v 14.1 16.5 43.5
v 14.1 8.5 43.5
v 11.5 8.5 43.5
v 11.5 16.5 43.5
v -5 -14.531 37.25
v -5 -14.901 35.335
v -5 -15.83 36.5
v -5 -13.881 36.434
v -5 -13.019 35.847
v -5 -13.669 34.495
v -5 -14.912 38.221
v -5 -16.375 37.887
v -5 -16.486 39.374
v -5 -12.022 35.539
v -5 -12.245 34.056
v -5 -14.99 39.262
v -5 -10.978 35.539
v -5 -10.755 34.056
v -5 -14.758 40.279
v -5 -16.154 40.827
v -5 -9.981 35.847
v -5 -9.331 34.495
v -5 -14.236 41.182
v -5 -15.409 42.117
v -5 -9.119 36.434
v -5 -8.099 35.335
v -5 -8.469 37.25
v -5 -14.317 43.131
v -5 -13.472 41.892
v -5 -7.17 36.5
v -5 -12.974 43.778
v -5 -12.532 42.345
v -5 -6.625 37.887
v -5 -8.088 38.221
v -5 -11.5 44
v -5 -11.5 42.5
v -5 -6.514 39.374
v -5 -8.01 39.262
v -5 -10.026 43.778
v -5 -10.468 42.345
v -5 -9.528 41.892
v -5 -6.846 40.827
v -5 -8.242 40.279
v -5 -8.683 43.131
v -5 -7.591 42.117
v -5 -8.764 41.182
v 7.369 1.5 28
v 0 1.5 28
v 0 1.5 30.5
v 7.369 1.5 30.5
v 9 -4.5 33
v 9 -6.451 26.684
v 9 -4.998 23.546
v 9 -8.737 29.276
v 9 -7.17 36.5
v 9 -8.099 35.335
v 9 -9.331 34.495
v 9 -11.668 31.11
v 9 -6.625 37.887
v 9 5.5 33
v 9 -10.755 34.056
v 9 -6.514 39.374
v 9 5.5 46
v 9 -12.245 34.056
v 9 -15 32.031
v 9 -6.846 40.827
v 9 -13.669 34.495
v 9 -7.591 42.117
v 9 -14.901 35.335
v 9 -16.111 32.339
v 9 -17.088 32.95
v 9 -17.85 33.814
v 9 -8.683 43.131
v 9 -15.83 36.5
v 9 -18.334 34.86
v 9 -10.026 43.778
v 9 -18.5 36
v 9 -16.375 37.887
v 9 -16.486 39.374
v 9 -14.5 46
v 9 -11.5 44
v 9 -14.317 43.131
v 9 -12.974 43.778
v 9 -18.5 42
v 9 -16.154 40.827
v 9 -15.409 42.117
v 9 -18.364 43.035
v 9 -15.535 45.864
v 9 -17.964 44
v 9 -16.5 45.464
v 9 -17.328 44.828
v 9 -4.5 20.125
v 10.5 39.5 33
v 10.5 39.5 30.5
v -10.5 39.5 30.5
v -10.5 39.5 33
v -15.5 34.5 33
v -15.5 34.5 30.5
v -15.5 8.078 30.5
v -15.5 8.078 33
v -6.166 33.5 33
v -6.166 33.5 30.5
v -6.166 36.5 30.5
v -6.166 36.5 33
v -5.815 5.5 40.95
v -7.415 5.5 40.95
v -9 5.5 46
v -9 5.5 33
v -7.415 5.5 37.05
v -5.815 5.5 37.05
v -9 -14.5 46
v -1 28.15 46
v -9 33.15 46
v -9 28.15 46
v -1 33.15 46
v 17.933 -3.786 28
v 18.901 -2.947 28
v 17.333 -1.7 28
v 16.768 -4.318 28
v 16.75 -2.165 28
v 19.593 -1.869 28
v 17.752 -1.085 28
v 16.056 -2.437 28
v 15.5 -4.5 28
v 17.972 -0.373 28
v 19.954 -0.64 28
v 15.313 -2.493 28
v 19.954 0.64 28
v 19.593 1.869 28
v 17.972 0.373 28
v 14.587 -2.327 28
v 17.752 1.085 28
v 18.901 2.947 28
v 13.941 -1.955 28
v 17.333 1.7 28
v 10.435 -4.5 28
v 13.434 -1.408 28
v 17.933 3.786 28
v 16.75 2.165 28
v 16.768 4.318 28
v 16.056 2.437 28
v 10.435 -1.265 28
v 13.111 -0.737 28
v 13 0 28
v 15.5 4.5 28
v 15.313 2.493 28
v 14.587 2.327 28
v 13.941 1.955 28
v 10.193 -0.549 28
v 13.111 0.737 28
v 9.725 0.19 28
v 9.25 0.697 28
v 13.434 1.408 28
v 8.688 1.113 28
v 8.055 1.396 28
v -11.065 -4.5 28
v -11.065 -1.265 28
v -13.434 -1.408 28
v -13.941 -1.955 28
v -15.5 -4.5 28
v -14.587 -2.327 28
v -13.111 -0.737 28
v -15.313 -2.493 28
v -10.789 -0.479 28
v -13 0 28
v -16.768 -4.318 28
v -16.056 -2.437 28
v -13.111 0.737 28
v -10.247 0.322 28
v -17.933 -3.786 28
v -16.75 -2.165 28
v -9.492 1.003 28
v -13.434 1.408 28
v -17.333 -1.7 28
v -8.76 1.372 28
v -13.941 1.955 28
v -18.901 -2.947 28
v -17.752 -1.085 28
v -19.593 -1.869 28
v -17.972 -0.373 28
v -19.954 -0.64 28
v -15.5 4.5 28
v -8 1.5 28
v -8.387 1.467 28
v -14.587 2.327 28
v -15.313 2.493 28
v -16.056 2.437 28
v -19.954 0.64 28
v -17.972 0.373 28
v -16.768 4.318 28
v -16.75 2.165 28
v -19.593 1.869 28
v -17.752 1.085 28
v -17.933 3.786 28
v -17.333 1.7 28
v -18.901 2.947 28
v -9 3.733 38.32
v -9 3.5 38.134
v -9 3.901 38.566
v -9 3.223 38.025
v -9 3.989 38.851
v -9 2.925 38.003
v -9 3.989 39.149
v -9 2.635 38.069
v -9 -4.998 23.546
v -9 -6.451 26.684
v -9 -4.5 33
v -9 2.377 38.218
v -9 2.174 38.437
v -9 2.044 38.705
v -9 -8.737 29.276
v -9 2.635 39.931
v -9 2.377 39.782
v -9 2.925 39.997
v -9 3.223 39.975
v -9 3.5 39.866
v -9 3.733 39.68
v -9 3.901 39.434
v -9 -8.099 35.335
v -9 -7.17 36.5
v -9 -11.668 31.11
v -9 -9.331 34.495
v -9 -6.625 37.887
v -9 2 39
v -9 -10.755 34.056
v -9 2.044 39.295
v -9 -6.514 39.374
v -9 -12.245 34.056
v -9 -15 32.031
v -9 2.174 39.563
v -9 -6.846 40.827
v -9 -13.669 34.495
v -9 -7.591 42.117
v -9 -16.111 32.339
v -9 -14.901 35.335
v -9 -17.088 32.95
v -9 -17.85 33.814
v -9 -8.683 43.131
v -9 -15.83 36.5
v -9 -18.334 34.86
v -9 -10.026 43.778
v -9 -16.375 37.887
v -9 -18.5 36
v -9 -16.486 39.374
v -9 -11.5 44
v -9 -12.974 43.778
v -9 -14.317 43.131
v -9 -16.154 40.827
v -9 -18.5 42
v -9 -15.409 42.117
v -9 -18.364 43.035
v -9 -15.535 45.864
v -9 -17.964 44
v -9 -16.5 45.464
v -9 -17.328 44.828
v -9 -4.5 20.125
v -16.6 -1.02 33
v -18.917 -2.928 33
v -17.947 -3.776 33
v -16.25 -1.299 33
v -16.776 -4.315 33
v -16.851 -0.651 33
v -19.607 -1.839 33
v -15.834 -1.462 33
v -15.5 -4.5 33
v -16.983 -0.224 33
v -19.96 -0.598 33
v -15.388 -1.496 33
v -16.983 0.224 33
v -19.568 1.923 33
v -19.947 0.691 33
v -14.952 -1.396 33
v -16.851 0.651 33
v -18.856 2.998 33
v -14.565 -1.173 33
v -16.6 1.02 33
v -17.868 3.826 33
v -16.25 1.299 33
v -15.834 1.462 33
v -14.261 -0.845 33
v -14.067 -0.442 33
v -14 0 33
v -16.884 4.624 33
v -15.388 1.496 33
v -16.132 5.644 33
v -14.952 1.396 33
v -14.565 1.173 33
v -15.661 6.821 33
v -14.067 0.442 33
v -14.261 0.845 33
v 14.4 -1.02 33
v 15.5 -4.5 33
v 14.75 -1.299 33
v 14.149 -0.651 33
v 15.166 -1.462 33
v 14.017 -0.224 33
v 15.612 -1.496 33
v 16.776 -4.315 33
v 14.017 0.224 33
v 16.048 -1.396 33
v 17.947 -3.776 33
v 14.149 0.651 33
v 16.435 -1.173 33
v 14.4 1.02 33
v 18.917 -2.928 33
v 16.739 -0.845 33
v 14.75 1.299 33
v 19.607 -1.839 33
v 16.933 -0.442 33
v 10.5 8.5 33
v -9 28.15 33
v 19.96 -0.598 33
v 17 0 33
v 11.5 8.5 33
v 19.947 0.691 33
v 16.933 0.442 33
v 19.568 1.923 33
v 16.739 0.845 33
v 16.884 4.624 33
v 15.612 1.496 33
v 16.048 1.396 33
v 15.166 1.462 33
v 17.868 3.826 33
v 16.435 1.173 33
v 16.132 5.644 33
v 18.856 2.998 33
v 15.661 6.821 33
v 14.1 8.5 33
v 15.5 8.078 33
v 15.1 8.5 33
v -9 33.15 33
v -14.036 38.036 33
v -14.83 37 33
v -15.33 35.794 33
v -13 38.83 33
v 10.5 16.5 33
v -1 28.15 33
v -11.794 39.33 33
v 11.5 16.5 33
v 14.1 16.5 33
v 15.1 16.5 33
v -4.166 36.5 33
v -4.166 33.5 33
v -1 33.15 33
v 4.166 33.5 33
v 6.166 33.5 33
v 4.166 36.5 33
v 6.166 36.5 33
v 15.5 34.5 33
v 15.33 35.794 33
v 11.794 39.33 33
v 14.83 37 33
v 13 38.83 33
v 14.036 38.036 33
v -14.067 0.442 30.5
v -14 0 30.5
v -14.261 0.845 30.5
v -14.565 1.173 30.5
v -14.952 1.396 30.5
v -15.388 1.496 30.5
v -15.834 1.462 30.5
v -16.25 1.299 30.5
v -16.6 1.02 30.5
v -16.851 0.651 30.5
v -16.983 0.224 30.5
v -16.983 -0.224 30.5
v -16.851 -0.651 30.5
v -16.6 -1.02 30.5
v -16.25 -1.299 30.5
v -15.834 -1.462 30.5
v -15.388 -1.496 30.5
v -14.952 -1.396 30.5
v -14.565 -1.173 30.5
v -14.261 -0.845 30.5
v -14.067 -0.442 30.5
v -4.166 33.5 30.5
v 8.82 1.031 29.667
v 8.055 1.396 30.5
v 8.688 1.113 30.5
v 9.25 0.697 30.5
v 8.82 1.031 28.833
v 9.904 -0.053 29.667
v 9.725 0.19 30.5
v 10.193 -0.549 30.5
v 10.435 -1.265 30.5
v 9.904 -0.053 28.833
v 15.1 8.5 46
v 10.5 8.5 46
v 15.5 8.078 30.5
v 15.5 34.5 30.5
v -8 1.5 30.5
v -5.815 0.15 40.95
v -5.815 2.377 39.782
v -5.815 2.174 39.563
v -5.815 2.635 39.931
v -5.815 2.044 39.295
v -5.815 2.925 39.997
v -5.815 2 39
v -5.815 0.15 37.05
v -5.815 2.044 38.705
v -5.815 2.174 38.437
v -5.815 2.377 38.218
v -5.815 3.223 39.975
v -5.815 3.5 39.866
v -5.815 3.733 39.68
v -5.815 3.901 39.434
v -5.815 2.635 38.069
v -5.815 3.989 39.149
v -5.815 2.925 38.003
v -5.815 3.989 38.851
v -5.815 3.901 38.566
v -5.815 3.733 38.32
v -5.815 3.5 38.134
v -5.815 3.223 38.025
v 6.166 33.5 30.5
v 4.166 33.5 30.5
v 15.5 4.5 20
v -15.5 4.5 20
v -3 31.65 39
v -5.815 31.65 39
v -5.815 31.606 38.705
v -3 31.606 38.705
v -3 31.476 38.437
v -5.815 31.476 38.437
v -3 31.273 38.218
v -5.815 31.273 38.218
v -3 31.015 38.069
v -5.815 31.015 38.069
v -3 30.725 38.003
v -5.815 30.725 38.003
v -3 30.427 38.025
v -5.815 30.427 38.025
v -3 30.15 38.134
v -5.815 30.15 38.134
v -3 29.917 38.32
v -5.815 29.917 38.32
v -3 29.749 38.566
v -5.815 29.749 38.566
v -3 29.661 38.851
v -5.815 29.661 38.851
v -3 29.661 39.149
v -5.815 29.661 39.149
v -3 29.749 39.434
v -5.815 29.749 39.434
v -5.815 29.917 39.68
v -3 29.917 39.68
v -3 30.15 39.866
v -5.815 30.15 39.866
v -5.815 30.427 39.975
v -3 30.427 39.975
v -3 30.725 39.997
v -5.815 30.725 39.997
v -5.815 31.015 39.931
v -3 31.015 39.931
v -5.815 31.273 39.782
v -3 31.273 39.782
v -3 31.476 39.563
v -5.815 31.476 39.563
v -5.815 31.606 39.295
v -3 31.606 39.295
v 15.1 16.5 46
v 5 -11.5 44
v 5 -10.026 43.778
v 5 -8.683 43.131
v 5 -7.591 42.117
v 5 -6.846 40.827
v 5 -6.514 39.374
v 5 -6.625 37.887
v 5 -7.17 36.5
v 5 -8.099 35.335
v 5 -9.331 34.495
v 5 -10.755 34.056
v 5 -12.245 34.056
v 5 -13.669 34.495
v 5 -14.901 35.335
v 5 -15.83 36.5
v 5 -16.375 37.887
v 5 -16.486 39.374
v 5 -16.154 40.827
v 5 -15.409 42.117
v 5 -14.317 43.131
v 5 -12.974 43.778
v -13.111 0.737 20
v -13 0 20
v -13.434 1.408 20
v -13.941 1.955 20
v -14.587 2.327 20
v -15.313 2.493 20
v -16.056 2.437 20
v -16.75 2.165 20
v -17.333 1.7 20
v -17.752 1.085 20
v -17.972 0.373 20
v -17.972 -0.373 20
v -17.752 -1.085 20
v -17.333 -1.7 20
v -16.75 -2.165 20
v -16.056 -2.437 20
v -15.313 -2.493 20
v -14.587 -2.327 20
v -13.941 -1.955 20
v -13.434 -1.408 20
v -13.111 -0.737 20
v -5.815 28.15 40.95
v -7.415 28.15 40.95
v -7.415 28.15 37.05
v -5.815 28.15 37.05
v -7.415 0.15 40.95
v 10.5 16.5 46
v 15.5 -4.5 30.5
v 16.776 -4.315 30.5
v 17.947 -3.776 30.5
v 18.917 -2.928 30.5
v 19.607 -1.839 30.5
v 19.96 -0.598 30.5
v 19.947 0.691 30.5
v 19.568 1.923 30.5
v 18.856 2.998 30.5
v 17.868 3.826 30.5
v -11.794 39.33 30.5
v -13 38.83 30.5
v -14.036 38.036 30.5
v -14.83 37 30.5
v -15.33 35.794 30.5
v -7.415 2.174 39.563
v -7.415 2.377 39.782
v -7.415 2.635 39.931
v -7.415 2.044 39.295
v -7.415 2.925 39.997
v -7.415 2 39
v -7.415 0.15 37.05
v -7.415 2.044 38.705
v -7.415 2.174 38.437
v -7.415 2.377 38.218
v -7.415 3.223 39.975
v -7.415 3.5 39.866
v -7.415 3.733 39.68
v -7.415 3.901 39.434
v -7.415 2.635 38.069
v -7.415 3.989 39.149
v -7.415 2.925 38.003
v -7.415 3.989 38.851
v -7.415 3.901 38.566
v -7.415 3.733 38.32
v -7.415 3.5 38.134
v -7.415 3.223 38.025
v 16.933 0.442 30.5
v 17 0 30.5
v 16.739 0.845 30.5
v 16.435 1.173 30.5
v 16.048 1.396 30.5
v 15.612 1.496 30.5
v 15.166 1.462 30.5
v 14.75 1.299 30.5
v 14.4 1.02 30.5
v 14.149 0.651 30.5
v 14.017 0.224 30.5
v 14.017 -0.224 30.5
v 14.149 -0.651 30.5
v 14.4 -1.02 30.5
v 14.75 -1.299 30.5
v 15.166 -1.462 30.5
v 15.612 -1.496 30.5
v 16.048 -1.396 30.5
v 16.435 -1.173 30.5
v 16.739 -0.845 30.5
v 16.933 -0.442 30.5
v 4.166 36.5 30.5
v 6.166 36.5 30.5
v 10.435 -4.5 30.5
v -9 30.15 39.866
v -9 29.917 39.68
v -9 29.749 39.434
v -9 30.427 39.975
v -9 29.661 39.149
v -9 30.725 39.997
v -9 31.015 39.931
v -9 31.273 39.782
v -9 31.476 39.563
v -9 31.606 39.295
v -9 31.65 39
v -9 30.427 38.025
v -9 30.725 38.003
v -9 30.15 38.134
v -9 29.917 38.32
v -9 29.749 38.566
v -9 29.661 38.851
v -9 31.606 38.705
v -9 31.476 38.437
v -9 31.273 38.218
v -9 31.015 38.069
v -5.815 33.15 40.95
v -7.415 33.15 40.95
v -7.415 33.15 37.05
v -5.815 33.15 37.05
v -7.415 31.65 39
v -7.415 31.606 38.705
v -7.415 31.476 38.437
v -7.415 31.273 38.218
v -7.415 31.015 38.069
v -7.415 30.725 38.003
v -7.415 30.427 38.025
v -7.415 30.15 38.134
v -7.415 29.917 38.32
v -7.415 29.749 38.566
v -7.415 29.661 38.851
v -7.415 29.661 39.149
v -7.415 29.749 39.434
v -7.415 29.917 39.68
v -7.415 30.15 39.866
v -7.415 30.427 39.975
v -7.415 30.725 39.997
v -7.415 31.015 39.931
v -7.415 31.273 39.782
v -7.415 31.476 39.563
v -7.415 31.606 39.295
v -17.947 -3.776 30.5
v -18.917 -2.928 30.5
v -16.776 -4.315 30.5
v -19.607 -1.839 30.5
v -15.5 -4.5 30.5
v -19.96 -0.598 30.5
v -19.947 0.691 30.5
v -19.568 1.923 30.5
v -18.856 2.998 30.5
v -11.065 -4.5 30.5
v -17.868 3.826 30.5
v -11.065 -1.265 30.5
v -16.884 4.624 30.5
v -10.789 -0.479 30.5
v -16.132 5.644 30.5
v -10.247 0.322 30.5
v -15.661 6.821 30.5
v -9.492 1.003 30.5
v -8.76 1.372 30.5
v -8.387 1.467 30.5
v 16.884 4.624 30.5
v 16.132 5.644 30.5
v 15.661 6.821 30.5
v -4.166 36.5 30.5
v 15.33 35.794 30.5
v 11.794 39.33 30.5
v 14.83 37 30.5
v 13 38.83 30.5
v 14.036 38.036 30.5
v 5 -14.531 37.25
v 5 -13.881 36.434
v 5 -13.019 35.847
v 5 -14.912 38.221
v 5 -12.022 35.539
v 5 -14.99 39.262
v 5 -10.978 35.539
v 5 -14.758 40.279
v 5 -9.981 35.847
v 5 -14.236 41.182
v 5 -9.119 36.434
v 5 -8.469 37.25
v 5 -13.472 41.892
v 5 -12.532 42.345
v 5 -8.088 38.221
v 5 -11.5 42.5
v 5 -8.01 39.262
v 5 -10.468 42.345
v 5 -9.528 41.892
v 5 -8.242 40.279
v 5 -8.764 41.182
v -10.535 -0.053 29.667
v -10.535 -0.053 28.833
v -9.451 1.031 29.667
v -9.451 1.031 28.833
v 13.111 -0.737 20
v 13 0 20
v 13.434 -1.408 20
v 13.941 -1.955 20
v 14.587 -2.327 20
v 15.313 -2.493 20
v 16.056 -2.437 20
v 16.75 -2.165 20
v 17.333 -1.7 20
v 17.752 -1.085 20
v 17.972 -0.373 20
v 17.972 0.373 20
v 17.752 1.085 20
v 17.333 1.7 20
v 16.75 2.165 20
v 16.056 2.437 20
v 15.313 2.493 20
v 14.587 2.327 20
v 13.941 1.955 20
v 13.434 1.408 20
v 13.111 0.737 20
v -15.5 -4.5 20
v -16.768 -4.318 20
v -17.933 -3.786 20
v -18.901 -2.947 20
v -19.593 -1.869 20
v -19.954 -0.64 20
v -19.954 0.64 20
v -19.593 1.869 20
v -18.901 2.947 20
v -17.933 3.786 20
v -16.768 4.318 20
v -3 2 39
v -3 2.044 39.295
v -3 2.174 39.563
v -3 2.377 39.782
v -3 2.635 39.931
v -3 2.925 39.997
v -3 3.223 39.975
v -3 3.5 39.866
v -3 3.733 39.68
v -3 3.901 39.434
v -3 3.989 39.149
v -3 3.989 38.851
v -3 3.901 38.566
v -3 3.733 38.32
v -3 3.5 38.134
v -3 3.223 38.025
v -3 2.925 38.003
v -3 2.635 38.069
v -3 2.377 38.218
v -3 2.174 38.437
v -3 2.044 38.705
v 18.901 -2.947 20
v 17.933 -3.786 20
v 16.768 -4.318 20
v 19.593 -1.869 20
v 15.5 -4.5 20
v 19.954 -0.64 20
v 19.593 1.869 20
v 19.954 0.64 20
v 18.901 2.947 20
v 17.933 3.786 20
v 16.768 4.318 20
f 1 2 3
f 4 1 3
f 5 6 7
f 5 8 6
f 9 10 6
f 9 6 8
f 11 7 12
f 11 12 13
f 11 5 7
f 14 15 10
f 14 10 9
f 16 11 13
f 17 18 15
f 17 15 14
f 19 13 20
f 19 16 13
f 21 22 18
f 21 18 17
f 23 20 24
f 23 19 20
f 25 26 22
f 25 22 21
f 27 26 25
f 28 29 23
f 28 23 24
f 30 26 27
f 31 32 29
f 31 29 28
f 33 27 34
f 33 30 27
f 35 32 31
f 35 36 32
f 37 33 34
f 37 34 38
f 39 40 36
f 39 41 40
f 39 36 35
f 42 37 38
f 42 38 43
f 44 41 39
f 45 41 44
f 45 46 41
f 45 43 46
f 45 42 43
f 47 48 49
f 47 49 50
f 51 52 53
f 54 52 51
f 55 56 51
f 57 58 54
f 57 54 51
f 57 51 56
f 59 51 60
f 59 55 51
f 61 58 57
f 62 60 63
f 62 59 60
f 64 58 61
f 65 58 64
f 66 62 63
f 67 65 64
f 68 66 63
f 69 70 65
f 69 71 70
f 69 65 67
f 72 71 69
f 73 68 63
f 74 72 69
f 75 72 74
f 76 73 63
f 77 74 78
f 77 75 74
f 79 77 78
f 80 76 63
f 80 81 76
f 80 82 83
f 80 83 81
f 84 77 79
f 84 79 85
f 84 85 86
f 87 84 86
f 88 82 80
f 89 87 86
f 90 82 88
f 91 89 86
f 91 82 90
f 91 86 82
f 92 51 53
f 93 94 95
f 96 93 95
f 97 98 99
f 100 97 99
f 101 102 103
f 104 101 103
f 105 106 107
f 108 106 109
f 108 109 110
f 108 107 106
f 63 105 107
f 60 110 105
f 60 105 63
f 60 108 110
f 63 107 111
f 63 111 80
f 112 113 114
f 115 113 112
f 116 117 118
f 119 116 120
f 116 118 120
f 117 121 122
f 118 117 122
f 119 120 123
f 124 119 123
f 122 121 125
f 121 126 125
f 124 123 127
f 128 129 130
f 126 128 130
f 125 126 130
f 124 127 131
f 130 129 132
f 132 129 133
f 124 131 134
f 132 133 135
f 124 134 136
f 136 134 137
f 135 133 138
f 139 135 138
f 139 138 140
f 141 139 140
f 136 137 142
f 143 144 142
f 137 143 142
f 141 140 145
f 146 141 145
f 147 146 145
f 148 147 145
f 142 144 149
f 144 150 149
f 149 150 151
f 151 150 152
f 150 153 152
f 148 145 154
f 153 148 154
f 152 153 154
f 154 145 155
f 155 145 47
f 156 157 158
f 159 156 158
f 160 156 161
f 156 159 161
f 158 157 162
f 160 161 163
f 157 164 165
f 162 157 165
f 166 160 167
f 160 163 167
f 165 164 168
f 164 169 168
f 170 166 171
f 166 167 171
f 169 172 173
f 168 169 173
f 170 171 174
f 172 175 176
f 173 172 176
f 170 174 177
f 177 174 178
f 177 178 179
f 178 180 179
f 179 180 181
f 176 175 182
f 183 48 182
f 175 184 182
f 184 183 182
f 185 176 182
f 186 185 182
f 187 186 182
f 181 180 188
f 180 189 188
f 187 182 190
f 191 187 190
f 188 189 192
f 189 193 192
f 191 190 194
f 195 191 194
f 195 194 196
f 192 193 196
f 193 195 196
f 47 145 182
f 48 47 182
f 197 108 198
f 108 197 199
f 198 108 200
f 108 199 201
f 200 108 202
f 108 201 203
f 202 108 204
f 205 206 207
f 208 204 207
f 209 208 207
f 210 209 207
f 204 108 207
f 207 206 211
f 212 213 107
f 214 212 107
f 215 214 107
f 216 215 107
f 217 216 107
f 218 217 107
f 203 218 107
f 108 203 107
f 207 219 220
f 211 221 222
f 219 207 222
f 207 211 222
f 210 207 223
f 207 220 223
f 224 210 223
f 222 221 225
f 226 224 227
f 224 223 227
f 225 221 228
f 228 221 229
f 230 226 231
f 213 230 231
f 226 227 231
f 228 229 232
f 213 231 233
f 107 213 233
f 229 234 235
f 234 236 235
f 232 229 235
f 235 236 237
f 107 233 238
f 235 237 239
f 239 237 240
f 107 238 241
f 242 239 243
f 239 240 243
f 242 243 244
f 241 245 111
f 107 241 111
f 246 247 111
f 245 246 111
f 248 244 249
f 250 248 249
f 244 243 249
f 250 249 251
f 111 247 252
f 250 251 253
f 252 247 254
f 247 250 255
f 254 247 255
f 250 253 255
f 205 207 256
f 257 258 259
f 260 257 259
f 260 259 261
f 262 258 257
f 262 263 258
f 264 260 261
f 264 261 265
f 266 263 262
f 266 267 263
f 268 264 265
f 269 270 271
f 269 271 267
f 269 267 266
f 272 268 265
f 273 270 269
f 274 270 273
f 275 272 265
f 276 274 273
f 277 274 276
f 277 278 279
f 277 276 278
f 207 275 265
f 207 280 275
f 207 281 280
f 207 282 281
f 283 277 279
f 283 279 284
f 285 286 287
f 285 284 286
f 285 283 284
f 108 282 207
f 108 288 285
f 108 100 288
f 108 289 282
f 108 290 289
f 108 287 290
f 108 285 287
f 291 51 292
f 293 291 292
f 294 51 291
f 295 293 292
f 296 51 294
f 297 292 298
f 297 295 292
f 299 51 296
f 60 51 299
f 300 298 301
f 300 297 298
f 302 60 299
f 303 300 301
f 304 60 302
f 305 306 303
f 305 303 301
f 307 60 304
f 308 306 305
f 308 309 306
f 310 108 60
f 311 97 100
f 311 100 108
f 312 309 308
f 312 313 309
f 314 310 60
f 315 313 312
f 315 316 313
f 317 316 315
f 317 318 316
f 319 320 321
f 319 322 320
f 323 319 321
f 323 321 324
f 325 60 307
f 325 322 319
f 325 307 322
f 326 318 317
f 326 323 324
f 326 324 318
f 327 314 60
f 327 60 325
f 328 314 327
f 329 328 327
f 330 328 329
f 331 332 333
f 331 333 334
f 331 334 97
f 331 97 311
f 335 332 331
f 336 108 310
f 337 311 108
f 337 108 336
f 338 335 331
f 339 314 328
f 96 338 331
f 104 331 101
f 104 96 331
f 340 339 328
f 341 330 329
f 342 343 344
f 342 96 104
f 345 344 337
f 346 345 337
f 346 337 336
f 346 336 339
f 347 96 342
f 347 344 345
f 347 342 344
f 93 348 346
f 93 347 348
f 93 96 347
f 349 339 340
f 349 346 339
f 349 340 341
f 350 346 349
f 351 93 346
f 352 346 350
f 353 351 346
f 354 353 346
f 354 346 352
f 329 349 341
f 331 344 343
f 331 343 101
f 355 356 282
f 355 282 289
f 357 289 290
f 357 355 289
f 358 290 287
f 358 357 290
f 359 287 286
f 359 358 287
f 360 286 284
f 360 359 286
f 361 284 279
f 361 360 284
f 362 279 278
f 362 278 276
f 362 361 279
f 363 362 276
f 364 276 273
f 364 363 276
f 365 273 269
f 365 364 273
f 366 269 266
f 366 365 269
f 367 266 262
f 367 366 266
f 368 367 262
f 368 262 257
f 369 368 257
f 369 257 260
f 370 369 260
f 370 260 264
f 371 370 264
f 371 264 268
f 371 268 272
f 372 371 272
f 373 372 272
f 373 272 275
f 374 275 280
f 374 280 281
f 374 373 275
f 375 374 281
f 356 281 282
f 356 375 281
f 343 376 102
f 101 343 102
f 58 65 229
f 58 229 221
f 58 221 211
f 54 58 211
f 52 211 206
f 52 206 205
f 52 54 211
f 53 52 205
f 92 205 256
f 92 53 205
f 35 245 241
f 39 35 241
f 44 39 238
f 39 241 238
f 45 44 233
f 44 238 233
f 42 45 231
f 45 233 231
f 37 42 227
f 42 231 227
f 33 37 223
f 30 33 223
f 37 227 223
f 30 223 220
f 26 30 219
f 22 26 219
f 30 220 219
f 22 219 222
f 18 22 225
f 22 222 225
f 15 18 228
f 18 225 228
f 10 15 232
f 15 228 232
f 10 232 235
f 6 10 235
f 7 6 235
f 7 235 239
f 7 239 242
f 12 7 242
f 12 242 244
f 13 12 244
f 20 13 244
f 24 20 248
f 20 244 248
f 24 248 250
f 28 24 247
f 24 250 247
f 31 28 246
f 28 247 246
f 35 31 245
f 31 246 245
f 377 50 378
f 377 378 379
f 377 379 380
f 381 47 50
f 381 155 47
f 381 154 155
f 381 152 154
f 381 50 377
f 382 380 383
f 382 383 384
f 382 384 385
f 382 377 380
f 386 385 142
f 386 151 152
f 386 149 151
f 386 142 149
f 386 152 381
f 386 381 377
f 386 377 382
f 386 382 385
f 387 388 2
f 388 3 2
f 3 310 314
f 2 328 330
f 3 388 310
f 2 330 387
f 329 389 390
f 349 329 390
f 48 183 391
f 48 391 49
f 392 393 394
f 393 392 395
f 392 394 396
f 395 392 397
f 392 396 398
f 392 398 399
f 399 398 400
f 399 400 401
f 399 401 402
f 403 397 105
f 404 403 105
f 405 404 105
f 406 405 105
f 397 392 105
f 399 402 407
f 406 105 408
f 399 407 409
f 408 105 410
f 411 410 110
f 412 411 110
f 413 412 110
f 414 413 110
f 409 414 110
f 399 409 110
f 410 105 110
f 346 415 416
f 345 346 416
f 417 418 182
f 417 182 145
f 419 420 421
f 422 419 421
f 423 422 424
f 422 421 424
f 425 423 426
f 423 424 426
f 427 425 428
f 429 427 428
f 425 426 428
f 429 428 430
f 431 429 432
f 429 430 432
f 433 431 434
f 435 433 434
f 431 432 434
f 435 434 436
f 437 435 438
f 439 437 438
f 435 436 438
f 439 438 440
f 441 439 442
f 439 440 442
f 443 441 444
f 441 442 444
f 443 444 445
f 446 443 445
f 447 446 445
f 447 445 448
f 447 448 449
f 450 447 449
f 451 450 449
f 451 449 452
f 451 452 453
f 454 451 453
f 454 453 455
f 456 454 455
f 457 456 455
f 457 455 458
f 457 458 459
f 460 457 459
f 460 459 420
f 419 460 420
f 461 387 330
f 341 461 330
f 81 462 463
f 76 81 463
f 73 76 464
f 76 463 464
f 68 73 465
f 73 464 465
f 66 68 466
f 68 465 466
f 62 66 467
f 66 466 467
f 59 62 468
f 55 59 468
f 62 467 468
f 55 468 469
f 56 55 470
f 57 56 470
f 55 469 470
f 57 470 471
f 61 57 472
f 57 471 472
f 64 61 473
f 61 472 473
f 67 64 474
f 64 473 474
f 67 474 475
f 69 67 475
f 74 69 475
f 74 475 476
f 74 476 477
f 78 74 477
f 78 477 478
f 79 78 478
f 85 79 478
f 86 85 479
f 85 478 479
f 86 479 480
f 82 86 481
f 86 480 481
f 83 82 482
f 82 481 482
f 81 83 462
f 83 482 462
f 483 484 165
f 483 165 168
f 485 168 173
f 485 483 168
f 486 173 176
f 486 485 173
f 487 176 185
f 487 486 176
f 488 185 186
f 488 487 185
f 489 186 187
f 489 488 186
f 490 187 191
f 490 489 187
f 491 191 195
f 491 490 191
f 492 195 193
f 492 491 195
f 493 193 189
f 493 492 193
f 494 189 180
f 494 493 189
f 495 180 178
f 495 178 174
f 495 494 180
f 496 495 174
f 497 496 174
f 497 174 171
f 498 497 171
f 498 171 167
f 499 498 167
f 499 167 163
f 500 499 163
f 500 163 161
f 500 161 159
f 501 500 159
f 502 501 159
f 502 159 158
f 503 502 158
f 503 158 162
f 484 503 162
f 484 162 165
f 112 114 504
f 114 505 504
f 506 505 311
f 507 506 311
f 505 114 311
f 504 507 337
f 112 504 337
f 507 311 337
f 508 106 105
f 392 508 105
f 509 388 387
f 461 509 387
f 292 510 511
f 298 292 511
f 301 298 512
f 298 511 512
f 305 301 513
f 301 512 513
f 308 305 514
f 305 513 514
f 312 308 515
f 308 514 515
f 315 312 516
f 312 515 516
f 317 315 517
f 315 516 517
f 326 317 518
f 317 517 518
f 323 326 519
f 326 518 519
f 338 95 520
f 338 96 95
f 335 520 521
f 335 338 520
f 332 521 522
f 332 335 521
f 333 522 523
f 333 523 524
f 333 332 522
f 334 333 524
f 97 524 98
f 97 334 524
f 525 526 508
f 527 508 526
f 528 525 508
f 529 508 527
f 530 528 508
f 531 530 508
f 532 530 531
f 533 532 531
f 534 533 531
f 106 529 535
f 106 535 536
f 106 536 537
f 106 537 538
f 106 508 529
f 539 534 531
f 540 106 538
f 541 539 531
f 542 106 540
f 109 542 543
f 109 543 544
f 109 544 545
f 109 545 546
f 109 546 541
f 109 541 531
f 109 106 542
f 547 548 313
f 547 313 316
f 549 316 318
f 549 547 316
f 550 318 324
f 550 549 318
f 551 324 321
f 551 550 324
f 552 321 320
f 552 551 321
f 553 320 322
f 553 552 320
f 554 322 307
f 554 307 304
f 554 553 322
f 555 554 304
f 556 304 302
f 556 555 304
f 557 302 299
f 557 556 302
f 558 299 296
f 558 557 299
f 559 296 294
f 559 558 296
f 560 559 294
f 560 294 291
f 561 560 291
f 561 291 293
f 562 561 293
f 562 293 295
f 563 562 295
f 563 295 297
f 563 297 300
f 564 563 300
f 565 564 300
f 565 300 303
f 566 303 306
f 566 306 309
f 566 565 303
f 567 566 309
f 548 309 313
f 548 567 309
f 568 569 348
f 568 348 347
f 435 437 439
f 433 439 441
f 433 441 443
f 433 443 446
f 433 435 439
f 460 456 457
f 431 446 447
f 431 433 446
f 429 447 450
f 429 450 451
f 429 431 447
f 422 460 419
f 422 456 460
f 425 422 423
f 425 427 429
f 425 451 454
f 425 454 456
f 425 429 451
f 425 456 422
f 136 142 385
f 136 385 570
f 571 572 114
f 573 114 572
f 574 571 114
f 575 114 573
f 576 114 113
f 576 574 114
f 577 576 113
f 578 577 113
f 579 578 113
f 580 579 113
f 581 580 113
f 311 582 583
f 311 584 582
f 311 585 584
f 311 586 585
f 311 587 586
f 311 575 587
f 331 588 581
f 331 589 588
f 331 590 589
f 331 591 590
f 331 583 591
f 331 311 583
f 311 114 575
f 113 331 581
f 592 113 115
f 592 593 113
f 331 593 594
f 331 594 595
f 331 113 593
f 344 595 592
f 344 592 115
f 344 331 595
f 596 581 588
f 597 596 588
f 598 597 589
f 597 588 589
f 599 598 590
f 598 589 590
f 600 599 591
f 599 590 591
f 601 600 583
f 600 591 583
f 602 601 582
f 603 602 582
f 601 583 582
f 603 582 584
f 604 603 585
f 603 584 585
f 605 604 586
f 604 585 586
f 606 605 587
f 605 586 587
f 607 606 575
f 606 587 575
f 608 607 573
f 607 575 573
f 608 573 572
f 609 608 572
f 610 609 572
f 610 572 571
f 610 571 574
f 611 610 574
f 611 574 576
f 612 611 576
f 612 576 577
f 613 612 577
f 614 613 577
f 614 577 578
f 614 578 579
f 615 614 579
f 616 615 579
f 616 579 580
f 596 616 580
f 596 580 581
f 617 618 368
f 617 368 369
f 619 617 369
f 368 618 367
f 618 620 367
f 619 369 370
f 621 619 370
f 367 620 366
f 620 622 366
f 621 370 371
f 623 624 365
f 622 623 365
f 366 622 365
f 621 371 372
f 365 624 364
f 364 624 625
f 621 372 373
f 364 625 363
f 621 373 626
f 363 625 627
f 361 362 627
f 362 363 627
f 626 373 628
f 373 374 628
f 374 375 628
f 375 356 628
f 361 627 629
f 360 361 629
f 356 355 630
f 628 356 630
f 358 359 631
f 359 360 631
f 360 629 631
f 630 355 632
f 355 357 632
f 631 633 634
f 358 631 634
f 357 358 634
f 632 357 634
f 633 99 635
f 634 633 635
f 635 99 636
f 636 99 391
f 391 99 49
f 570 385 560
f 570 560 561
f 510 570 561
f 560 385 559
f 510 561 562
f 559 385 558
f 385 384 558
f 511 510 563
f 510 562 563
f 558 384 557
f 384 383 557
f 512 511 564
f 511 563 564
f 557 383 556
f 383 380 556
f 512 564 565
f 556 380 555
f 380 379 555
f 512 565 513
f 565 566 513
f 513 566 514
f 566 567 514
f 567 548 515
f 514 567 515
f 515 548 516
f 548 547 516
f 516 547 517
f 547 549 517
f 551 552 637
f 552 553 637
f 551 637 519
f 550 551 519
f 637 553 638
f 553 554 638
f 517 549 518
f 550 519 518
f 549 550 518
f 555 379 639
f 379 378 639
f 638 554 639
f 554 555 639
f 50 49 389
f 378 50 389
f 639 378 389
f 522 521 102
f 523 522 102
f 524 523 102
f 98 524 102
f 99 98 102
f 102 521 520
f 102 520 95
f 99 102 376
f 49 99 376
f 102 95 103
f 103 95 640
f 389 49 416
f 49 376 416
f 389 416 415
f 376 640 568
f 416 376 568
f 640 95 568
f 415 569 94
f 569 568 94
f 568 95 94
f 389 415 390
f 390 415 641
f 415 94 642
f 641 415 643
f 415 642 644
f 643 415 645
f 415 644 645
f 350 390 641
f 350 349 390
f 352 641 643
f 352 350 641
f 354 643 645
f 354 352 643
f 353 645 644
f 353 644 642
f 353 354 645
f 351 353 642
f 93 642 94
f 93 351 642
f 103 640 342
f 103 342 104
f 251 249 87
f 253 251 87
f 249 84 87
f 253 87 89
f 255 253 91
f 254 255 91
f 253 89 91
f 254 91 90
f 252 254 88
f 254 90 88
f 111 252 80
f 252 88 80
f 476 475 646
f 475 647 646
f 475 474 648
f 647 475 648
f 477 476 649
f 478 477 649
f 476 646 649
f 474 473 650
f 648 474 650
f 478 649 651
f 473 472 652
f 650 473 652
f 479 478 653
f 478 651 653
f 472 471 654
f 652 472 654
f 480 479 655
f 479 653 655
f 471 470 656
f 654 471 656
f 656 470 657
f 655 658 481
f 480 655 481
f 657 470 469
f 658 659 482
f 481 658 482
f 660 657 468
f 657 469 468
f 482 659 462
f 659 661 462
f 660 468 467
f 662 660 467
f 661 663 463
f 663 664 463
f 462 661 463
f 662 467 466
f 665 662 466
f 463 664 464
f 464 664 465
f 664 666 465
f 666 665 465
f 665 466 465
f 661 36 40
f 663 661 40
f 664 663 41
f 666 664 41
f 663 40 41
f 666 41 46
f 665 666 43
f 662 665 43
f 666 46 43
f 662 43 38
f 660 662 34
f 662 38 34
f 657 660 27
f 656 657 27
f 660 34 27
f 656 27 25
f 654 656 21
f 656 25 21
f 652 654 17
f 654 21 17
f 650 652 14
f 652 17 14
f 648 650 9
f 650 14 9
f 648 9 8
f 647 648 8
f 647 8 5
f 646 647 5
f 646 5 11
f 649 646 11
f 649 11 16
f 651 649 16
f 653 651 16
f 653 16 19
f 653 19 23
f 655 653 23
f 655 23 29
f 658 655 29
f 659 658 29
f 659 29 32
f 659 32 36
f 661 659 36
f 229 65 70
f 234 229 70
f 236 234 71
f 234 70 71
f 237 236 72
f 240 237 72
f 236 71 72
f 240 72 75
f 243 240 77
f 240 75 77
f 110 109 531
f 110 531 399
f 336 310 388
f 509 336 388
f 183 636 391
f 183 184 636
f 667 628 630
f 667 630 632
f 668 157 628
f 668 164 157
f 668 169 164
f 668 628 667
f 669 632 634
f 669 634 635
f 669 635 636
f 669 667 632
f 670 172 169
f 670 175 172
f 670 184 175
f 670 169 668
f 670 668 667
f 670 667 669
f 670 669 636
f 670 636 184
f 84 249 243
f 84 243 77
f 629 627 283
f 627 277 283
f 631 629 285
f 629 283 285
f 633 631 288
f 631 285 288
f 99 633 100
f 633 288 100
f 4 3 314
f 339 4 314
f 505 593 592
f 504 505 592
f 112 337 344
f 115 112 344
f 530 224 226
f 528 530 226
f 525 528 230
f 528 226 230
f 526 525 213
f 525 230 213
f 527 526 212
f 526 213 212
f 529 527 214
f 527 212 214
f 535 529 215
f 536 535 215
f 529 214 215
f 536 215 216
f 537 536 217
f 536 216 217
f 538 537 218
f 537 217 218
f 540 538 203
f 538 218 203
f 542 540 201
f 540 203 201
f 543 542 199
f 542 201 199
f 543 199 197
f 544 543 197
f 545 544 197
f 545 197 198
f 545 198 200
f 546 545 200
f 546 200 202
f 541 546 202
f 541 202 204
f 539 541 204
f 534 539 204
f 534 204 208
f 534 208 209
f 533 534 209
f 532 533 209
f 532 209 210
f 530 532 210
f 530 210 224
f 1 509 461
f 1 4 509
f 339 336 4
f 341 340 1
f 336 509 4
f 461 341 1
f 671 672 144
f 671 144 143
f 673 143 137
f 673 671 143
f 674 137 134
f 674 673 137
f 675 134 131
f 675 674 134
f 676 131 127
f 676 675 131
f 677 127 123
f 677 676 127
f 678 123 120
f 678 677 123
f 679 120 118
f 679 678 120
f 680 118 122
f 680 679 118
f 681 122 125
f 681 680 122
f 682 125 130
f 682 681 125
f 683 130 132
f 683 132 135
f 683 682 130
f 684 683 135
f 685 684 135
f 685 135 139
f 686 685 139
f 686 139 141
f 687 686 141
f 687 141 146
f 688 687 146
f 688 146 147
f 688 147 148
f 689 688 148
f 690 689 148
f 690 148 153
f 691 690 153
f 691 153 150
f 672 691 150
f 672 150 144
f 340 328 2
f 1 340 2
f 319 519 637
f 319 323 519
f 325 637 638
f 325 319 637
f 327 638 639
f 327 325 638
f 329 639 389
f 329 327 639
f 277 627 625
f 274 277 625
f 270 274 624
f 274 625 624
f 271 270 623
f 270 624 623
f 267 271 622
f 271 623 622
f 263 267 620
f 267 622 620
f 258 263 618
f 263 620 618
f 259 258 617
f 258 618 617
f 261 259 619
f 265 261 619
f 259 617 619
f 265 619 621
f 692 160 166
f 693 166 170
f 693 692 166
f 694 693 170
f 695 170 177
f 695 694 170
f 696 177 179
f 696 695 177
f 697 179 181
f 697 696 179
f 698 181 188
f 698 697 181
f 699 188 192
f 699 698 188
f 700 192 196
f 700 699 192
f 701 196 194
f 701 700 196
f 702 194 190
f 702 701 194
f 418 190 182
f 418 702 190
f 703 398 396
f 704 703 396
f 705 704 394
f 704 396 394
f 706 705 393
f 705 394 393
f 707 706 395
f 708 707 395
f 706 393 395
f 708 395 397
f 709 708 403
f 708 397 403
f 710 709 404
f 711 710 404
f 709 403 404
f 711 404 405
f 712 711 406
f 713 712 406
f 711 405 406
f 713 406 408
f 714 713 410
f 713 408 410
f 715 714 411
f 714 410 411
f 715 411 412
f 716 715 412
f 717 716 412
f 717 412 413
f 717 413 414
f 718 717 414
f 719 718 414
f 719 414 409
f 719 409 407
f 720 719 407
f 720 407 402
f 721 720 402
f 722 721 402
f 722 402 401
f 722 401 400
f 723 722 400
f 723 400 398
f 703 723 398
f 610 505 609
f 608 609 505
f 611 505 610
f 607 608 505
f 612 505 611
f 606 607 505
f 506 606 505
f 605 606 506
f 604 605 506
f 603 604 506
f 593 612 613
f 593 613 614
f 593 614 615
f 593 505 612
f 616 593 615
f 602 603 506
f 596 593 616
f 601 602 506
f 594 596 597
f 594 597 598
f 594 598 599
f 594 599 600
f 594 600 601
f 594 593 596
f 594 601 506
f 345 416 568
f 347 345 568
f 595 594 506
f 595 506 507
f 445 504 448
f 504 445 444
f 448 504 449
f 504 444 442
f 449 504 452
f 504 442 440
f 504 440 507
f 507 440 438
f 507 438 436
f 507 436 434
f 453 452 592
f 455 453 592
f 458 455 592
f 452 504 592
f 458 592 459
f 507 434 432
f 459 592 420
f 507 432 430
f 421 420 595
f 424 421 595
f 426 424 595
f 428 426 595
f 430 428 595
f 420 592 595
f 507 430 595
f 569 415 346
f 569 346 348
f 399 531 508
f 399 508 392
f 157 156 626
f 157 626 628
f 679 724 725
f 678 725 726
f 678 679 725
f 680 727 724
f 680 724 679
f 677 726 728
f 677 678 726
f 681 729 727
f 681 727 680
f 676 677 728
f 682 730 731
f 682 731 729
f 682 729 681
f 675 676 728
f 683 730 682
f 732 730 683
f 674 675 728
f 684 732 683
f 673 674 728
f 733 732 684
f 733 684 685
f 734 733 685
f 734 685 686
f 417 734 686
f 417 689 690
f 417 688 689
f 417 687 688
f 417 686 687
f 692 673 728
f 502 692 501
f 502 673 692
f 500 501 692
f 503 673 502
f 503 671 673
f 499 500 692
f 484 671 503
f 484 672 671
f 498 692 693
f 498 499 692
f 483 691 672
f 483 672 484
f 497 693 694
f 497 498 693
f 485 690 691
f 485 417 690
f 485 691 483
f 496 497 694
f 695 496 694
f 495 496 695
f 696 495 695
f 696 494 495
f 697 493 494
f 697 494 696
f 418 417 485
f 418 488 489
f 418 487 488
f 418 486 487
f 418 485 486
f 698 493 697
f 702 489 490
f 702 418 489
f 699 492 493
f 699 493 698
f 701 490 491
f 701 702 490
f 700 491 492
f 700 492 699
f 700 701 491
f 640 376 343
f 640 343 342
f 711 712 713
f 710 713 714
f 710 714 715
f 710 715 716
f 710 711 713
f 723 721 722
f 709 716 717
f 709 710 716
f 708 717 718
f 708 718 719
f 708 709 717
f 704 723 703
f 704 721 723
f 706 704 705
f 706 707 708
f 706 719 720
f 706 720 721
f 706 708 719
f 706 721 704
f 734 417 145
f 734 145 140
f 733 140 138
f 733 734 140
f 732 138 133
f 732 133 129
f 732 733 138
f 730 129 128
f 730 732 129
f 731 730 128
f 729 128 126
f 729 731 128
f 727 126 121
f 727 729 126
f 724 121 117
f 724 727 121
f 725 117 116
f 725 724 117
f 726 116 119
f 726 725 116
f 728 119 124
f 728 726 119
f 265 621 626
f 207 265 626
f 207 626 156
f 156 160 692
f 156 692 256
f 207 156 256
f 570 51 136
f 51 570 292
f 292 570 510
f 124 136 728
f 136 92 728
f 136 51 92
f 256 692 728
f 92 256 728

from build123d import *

# Parameters (mm, degrees)
CROQUIS1_R              = 2.5
SALIENTE_EXTRUIR1_DEPTH = 28
SALIENTE_EXTRUIR3_DEPTH = 2.5
CROQUIS8_R              = 1.5
SALIENTE_EXTRUIR4_DEPTH = 2.5
CROQUIS9_W              = 18
CROQUIS9_H              = 10
SALIENTE_EXTRUIR5_DEPTH = 13
CROQUIS3_W              = 18
CROQUIS3_H              = 14
SALIENTE_EXTRUIR2_DEPTH = 14
CROQUIS4_R              = 5
CORTAR_EXTRUIR1_DEPTH   = 4
CORTAR_EXTRUIR2_START   = -14
CROQUIS4_2_R            = 5
CORTAR_EXTRUIR2_DEPTH   = 4
CORTAR_EXTRUIR3_REACH   = 67.584
CROQUIS5_R              = 3.5
REDONDEO1_R             = 4
CROQUIS10_W             = 40
CROQUIS10_H             = 9
CORTAR_EXTRUIR4_DEPTH   = 20
CROQUIS11_W             = 8
CROQUIS11_H             = 5
SALIENTE_EXTRUIR6_DEPTH = 13
CROQUIS12_R             = 1
CORTAR_EXTRUIR5_DEPTH   = 6
CROQUIS13_W             = 1.6
CROQUIS13_H             = 3.9
CORTAR_EXTRUIR6_DEPTH   = 33
REDONDEO2_R             = 5
REDONDEO3_R             = 12
SALIENTE_EXTRUIR7_START = 3
SALIENTE_EXTRUIR7_DEPTH = 8
CROQUIS16_W             = 2
CROQUIS16_H             = 3
CORTAR_EXTRUIR7_DEPTH   = 2.5


with BuildPart() as part:
    # Croquis1 → Saliente-Extruir1 (new body)
    with BuildSketch(Plane.XY):
        with BuildLine():
            Line((-15.5, 4.5), (15.5, 4.5))
            ThreePointArc((15.5, 4.5), (20, 0), (15.5, -4.5))
            Line((15.5, -4.5), (-15.5, -4.5))
            ThreePointArc((-15.5, -4.5), (-20, 0), (-15.5, 4.5))
        make_face()
        with Locations((-15.5, 0)):
            Circle(CROQUIS1_R, mode=Mode.SUBTRACT)
        with Locations(Location((15.5, 0, 0), (0, 0, 180))):
            Circle(CROQUIS1_R, mode=Mode.SUBTRACT)
    extrude(amount=SALIENTE_EXTRUIR1_DEPTH)

    # Croquis7 → Saliente-Extruir3 (add)
    with BuildSketch(Plane.XY.offset(28)):
        with BuildLine():
            Line((10.434561388, -1.264633608), (10.434561388, -4.5))
            Line((10.434561388, -4.5), (-11.065438612, -4.5))
            Line((-11.065438612, -4.5), (-11.065438612, -1.264634516))
            add(Edge.make_bspline(
                [(-11.065438612, -1.264634516), (-10.873261798, -0.150088047), (-9.571810624, 1.50000001), (-7.999999983, 1.5)],
                knots=[0, 0, 0, 0, 1, 1, 1, 1], degree=3))
            Line((-7.999999983, 1.5), (1e-08, 1.5))
            Line((1e-08, 1.5), (7.369122804, 1.500000949))
            add(Edge.make_bspline(
                [(7.369122804, 1.500000949), (8.940933445, 1.500000937), (10.242384596, -0.150087137), (10.434561388, -1.264633608)],
                knots=[0, 0, 0, 0, 1, 1, 1, 1], degree=3))
        make_face()
    extrude(amount=SALIENTE_EXTRUIR3_DEPTH)

    # Croquis8 → Saliente-Extruir4 (add)
    with BuildSketch(Plane.XY.offset(30.5)):
        with BuildLine():
            Line((15.5, 4.5), (15.5, 39.5))
            Line((15.5, 39.5), (-15.5, 39.5))
            Line((-15.5, 39.5), (-15.5, 4.5))
            ThreePointArc((-15.5, 4.5), (-20, 0), (-15.5, -4.5))
            Line((-15.5, -4.5), (15.5, -4.5))
            ThreePointArc((15.5, -4.5), (20, 0), (15.5, 4.5))
        make_face()
        with Locations((15.5, 0)):
            Circle(CROQUIS8_R, mode=Mode.SUBTRACT)
        with Locations((-15.5, 0)):
            Circle(CROQUIS8_R, mode=Mode.SUBTRACT)
    extrude(amount=SALIENTE_EXTRUIR4_DEPTH)

    # Croquis9 → Saliente-Extruir5 (add)
    with BuildSketch(Plane.XY.offset(33)):
        with Locations((0, 0.5)):
            Rectangle(CROQUIS9_W, CROQUIS9_H)
    extrude(amount=SALIENTE_EXTRUIR5_DEPTH)

    # Croquis3 → Saliente-Extruir2 (add)
    with BuildSketch(Plane.XZ.offset(4.5)):
        with Locations((0, 39)):
            Rectangle(CROQUIS3_W, CROQUIS3_H)
    extrude(amount=SALIENTE_EXTRUIR2_DEPTH)

    # Croquis4 → Cortar-Extruir1 (cut)
    with BuildSketch(Plane.ZY.offset(9)):
        with Locations((39, -11.5)):
            Circle(CROQUIS4_R)
    extrude(amount=-CORTAR_EXTRUIR1_DEPTH, mode=Mode.SUBTRACT)

    # Croquis4<2> → Cortar-Extruir2 (cut)
    with BuildSketch(Plane.ZY.offset(9).offset(CORTAR_EXTRUIR2_START)):
        with Locations((39, -11.5)):
            Circle(CROQUIS4_2_R)
    extrude(amount=-CORTAR_EXTRUIR2_DEPTH, mode=Mode.SUBTRACT)

    # Croquis5 → Cortar-Extruir3 (cut, up to next)
    with BuildSketch(Plane.ZY.offset(5), mode=Mode.PRIVATE) as cortar_extruir3_sk1:
        with Locations((39, -11.5)):
            Circle(CROQUIS5_R)
    cortar_extruir3_tool1 = extrude(cortar_extruir3_sk1.sketch, amount=-CORTAR_EXTRUIR3_REACH, mode=Mode.PRIVATE) & part.part
    add(cortar_extruir3_tool1.solids().sort_by_distance((-5, -11.5, 39))[0], mode=Mode.SUBTRACT)

    # Redondeo1
    redondeo1_edges = [part.edges().sort_by_distance(p)[0] for p in [
        (0, -18.5, 32),
        (0, -18.5, 46),
    ]]
    fillet(redondeo1_edges, radius=REDONDEO1_R)

    # Croquis10 → Cortar-Extruir4 (cut)
    with BuildSketch(Plane(origin=(0, 0, 0), x_dir=(-1, 0, 0), z_dir=(0, 0, -1))):
        Rectangle(CROQUIS10_W, CROQUIS10_H)
    extrude(amount=-CORTAR_EXTRUIR4_DEPTH, mode=Mode.SUBTRACT)

    # Croquis11 → Saliente-Extruir6 (add)
    with BuildSketch(Plane.XY.offset(33)):
        with Locations((-5, 30.65)):
            Rectangle(CROQUIS11_W, CROQUIS11_H)
    extrude(amount=SALIENTE_EXTRUIR6_DEPTH)

    # Croquis12 → Cortar-Extruir5 (cut)
    with BuildSketch(Plane.ZY.offset(9)):
        with Locations(Location((39, 3, 0), (0, 0, 270))):
            Circle(CROQUIS12_R)
        with Locations(Location((39, 30.65, 0), (0, 0, 90))):
            Circle(CROQUIS12_R)
    extrude(amount=-CORTAR_EXTRUIR5_DEPTH, mode=Mode.SUBTRACT)

    # Croquis13 → Cortar-Extruir6 (cut)
    with BuildSketch(Plane(origin=(0, 33.15, 0), x_dir=(1, 0, 0), z_dir=(0, 1, 0))):
        with Locations((-6.614967389, -39)):
            Rectangle(CROQUIS13_W, CROQUIS13_H)
    extrude(amount=-CORTAR_EXTRUIR6_DEPTH, mode=Mode.SUBTRACT)

    # Redondeo2
    redondeo2_edges = [part.edges().sort_by_distance(p)[0] for p in [
        (-15.5, 39.5, 31.75),
        (-15.5, 4.5, 31.75),
        (15.5, 4.5, 31.75),
        (15.5, 39.5, 31.75),
    ]]
    fillet(redondeo2_edges, radius=REDONDEO2_R)

    # Redondeo3
    # the kernel refuses this fillet: 12 mm, written as the material it adds along each edge
    with BuildSketch(Plane(origin=(9, -4.5, 32), x_dir=(0, 0, -1), z_dir=(-1, 0, 0))) as redondeo3_piece_1:
        with BuildLine():
            CenterArc((11.874507866, 12), REDONDEO3_R, 187.180755781, 82.819244219)
            Line((-0.031373033, 10.5), (-1.221961123, 10.35))
            ThreePointArc((-1.221961123, 10.35), (-1.2, 10), (-1.2, 0))
            Line((-1.2, 0), (0, -1.2))
            Line((0, -1.2), (11.874507866, -1.2))
            Line((11.874507866, -1.2), (11.874507866, 0))
        make_face()
    extrude(amount=18)

    # Croquis14 → Saliente-Extruir7 (add)
    with BuildSketch(Plane(origin=(0, 5.5, 0), x_dir=(1, 0, 0), z_dir=(0, 1, 0)).offset(SALIENTE_EXTRUIR7_START)):
        Polygon((10.5, -33), (10.5, -46.00000144), (15.1, -46.00000144), (15.1, -33), (14.1, -33), (14.1, -43.5), (11.5, -43.5), (11.5, -33), align=None)
    extrude(amount=SALIENTE_EXTRUIR7_DEPTH)

    # Croquis16 → Cortar-Extruir7 (cut)
    with BuildSketch(Plane(origin=(0, 0, 30.5), x_dir=(-1, 0, 0), z_dir=(0, 0, -1))):
        with Locations((-5.165983378, 35)):
            Rectangle(CROQUIS16_W, CROQUIS16_H)
        with Locations((5.165983378, 35)):
            Rectangle(CROQUIS16_W, CROQUIS16_H)
    extrude(amount=-CORTAR_EXTRUIR7_DEPTH, mode=Mode.SUBTRACT)


solid = part.part
